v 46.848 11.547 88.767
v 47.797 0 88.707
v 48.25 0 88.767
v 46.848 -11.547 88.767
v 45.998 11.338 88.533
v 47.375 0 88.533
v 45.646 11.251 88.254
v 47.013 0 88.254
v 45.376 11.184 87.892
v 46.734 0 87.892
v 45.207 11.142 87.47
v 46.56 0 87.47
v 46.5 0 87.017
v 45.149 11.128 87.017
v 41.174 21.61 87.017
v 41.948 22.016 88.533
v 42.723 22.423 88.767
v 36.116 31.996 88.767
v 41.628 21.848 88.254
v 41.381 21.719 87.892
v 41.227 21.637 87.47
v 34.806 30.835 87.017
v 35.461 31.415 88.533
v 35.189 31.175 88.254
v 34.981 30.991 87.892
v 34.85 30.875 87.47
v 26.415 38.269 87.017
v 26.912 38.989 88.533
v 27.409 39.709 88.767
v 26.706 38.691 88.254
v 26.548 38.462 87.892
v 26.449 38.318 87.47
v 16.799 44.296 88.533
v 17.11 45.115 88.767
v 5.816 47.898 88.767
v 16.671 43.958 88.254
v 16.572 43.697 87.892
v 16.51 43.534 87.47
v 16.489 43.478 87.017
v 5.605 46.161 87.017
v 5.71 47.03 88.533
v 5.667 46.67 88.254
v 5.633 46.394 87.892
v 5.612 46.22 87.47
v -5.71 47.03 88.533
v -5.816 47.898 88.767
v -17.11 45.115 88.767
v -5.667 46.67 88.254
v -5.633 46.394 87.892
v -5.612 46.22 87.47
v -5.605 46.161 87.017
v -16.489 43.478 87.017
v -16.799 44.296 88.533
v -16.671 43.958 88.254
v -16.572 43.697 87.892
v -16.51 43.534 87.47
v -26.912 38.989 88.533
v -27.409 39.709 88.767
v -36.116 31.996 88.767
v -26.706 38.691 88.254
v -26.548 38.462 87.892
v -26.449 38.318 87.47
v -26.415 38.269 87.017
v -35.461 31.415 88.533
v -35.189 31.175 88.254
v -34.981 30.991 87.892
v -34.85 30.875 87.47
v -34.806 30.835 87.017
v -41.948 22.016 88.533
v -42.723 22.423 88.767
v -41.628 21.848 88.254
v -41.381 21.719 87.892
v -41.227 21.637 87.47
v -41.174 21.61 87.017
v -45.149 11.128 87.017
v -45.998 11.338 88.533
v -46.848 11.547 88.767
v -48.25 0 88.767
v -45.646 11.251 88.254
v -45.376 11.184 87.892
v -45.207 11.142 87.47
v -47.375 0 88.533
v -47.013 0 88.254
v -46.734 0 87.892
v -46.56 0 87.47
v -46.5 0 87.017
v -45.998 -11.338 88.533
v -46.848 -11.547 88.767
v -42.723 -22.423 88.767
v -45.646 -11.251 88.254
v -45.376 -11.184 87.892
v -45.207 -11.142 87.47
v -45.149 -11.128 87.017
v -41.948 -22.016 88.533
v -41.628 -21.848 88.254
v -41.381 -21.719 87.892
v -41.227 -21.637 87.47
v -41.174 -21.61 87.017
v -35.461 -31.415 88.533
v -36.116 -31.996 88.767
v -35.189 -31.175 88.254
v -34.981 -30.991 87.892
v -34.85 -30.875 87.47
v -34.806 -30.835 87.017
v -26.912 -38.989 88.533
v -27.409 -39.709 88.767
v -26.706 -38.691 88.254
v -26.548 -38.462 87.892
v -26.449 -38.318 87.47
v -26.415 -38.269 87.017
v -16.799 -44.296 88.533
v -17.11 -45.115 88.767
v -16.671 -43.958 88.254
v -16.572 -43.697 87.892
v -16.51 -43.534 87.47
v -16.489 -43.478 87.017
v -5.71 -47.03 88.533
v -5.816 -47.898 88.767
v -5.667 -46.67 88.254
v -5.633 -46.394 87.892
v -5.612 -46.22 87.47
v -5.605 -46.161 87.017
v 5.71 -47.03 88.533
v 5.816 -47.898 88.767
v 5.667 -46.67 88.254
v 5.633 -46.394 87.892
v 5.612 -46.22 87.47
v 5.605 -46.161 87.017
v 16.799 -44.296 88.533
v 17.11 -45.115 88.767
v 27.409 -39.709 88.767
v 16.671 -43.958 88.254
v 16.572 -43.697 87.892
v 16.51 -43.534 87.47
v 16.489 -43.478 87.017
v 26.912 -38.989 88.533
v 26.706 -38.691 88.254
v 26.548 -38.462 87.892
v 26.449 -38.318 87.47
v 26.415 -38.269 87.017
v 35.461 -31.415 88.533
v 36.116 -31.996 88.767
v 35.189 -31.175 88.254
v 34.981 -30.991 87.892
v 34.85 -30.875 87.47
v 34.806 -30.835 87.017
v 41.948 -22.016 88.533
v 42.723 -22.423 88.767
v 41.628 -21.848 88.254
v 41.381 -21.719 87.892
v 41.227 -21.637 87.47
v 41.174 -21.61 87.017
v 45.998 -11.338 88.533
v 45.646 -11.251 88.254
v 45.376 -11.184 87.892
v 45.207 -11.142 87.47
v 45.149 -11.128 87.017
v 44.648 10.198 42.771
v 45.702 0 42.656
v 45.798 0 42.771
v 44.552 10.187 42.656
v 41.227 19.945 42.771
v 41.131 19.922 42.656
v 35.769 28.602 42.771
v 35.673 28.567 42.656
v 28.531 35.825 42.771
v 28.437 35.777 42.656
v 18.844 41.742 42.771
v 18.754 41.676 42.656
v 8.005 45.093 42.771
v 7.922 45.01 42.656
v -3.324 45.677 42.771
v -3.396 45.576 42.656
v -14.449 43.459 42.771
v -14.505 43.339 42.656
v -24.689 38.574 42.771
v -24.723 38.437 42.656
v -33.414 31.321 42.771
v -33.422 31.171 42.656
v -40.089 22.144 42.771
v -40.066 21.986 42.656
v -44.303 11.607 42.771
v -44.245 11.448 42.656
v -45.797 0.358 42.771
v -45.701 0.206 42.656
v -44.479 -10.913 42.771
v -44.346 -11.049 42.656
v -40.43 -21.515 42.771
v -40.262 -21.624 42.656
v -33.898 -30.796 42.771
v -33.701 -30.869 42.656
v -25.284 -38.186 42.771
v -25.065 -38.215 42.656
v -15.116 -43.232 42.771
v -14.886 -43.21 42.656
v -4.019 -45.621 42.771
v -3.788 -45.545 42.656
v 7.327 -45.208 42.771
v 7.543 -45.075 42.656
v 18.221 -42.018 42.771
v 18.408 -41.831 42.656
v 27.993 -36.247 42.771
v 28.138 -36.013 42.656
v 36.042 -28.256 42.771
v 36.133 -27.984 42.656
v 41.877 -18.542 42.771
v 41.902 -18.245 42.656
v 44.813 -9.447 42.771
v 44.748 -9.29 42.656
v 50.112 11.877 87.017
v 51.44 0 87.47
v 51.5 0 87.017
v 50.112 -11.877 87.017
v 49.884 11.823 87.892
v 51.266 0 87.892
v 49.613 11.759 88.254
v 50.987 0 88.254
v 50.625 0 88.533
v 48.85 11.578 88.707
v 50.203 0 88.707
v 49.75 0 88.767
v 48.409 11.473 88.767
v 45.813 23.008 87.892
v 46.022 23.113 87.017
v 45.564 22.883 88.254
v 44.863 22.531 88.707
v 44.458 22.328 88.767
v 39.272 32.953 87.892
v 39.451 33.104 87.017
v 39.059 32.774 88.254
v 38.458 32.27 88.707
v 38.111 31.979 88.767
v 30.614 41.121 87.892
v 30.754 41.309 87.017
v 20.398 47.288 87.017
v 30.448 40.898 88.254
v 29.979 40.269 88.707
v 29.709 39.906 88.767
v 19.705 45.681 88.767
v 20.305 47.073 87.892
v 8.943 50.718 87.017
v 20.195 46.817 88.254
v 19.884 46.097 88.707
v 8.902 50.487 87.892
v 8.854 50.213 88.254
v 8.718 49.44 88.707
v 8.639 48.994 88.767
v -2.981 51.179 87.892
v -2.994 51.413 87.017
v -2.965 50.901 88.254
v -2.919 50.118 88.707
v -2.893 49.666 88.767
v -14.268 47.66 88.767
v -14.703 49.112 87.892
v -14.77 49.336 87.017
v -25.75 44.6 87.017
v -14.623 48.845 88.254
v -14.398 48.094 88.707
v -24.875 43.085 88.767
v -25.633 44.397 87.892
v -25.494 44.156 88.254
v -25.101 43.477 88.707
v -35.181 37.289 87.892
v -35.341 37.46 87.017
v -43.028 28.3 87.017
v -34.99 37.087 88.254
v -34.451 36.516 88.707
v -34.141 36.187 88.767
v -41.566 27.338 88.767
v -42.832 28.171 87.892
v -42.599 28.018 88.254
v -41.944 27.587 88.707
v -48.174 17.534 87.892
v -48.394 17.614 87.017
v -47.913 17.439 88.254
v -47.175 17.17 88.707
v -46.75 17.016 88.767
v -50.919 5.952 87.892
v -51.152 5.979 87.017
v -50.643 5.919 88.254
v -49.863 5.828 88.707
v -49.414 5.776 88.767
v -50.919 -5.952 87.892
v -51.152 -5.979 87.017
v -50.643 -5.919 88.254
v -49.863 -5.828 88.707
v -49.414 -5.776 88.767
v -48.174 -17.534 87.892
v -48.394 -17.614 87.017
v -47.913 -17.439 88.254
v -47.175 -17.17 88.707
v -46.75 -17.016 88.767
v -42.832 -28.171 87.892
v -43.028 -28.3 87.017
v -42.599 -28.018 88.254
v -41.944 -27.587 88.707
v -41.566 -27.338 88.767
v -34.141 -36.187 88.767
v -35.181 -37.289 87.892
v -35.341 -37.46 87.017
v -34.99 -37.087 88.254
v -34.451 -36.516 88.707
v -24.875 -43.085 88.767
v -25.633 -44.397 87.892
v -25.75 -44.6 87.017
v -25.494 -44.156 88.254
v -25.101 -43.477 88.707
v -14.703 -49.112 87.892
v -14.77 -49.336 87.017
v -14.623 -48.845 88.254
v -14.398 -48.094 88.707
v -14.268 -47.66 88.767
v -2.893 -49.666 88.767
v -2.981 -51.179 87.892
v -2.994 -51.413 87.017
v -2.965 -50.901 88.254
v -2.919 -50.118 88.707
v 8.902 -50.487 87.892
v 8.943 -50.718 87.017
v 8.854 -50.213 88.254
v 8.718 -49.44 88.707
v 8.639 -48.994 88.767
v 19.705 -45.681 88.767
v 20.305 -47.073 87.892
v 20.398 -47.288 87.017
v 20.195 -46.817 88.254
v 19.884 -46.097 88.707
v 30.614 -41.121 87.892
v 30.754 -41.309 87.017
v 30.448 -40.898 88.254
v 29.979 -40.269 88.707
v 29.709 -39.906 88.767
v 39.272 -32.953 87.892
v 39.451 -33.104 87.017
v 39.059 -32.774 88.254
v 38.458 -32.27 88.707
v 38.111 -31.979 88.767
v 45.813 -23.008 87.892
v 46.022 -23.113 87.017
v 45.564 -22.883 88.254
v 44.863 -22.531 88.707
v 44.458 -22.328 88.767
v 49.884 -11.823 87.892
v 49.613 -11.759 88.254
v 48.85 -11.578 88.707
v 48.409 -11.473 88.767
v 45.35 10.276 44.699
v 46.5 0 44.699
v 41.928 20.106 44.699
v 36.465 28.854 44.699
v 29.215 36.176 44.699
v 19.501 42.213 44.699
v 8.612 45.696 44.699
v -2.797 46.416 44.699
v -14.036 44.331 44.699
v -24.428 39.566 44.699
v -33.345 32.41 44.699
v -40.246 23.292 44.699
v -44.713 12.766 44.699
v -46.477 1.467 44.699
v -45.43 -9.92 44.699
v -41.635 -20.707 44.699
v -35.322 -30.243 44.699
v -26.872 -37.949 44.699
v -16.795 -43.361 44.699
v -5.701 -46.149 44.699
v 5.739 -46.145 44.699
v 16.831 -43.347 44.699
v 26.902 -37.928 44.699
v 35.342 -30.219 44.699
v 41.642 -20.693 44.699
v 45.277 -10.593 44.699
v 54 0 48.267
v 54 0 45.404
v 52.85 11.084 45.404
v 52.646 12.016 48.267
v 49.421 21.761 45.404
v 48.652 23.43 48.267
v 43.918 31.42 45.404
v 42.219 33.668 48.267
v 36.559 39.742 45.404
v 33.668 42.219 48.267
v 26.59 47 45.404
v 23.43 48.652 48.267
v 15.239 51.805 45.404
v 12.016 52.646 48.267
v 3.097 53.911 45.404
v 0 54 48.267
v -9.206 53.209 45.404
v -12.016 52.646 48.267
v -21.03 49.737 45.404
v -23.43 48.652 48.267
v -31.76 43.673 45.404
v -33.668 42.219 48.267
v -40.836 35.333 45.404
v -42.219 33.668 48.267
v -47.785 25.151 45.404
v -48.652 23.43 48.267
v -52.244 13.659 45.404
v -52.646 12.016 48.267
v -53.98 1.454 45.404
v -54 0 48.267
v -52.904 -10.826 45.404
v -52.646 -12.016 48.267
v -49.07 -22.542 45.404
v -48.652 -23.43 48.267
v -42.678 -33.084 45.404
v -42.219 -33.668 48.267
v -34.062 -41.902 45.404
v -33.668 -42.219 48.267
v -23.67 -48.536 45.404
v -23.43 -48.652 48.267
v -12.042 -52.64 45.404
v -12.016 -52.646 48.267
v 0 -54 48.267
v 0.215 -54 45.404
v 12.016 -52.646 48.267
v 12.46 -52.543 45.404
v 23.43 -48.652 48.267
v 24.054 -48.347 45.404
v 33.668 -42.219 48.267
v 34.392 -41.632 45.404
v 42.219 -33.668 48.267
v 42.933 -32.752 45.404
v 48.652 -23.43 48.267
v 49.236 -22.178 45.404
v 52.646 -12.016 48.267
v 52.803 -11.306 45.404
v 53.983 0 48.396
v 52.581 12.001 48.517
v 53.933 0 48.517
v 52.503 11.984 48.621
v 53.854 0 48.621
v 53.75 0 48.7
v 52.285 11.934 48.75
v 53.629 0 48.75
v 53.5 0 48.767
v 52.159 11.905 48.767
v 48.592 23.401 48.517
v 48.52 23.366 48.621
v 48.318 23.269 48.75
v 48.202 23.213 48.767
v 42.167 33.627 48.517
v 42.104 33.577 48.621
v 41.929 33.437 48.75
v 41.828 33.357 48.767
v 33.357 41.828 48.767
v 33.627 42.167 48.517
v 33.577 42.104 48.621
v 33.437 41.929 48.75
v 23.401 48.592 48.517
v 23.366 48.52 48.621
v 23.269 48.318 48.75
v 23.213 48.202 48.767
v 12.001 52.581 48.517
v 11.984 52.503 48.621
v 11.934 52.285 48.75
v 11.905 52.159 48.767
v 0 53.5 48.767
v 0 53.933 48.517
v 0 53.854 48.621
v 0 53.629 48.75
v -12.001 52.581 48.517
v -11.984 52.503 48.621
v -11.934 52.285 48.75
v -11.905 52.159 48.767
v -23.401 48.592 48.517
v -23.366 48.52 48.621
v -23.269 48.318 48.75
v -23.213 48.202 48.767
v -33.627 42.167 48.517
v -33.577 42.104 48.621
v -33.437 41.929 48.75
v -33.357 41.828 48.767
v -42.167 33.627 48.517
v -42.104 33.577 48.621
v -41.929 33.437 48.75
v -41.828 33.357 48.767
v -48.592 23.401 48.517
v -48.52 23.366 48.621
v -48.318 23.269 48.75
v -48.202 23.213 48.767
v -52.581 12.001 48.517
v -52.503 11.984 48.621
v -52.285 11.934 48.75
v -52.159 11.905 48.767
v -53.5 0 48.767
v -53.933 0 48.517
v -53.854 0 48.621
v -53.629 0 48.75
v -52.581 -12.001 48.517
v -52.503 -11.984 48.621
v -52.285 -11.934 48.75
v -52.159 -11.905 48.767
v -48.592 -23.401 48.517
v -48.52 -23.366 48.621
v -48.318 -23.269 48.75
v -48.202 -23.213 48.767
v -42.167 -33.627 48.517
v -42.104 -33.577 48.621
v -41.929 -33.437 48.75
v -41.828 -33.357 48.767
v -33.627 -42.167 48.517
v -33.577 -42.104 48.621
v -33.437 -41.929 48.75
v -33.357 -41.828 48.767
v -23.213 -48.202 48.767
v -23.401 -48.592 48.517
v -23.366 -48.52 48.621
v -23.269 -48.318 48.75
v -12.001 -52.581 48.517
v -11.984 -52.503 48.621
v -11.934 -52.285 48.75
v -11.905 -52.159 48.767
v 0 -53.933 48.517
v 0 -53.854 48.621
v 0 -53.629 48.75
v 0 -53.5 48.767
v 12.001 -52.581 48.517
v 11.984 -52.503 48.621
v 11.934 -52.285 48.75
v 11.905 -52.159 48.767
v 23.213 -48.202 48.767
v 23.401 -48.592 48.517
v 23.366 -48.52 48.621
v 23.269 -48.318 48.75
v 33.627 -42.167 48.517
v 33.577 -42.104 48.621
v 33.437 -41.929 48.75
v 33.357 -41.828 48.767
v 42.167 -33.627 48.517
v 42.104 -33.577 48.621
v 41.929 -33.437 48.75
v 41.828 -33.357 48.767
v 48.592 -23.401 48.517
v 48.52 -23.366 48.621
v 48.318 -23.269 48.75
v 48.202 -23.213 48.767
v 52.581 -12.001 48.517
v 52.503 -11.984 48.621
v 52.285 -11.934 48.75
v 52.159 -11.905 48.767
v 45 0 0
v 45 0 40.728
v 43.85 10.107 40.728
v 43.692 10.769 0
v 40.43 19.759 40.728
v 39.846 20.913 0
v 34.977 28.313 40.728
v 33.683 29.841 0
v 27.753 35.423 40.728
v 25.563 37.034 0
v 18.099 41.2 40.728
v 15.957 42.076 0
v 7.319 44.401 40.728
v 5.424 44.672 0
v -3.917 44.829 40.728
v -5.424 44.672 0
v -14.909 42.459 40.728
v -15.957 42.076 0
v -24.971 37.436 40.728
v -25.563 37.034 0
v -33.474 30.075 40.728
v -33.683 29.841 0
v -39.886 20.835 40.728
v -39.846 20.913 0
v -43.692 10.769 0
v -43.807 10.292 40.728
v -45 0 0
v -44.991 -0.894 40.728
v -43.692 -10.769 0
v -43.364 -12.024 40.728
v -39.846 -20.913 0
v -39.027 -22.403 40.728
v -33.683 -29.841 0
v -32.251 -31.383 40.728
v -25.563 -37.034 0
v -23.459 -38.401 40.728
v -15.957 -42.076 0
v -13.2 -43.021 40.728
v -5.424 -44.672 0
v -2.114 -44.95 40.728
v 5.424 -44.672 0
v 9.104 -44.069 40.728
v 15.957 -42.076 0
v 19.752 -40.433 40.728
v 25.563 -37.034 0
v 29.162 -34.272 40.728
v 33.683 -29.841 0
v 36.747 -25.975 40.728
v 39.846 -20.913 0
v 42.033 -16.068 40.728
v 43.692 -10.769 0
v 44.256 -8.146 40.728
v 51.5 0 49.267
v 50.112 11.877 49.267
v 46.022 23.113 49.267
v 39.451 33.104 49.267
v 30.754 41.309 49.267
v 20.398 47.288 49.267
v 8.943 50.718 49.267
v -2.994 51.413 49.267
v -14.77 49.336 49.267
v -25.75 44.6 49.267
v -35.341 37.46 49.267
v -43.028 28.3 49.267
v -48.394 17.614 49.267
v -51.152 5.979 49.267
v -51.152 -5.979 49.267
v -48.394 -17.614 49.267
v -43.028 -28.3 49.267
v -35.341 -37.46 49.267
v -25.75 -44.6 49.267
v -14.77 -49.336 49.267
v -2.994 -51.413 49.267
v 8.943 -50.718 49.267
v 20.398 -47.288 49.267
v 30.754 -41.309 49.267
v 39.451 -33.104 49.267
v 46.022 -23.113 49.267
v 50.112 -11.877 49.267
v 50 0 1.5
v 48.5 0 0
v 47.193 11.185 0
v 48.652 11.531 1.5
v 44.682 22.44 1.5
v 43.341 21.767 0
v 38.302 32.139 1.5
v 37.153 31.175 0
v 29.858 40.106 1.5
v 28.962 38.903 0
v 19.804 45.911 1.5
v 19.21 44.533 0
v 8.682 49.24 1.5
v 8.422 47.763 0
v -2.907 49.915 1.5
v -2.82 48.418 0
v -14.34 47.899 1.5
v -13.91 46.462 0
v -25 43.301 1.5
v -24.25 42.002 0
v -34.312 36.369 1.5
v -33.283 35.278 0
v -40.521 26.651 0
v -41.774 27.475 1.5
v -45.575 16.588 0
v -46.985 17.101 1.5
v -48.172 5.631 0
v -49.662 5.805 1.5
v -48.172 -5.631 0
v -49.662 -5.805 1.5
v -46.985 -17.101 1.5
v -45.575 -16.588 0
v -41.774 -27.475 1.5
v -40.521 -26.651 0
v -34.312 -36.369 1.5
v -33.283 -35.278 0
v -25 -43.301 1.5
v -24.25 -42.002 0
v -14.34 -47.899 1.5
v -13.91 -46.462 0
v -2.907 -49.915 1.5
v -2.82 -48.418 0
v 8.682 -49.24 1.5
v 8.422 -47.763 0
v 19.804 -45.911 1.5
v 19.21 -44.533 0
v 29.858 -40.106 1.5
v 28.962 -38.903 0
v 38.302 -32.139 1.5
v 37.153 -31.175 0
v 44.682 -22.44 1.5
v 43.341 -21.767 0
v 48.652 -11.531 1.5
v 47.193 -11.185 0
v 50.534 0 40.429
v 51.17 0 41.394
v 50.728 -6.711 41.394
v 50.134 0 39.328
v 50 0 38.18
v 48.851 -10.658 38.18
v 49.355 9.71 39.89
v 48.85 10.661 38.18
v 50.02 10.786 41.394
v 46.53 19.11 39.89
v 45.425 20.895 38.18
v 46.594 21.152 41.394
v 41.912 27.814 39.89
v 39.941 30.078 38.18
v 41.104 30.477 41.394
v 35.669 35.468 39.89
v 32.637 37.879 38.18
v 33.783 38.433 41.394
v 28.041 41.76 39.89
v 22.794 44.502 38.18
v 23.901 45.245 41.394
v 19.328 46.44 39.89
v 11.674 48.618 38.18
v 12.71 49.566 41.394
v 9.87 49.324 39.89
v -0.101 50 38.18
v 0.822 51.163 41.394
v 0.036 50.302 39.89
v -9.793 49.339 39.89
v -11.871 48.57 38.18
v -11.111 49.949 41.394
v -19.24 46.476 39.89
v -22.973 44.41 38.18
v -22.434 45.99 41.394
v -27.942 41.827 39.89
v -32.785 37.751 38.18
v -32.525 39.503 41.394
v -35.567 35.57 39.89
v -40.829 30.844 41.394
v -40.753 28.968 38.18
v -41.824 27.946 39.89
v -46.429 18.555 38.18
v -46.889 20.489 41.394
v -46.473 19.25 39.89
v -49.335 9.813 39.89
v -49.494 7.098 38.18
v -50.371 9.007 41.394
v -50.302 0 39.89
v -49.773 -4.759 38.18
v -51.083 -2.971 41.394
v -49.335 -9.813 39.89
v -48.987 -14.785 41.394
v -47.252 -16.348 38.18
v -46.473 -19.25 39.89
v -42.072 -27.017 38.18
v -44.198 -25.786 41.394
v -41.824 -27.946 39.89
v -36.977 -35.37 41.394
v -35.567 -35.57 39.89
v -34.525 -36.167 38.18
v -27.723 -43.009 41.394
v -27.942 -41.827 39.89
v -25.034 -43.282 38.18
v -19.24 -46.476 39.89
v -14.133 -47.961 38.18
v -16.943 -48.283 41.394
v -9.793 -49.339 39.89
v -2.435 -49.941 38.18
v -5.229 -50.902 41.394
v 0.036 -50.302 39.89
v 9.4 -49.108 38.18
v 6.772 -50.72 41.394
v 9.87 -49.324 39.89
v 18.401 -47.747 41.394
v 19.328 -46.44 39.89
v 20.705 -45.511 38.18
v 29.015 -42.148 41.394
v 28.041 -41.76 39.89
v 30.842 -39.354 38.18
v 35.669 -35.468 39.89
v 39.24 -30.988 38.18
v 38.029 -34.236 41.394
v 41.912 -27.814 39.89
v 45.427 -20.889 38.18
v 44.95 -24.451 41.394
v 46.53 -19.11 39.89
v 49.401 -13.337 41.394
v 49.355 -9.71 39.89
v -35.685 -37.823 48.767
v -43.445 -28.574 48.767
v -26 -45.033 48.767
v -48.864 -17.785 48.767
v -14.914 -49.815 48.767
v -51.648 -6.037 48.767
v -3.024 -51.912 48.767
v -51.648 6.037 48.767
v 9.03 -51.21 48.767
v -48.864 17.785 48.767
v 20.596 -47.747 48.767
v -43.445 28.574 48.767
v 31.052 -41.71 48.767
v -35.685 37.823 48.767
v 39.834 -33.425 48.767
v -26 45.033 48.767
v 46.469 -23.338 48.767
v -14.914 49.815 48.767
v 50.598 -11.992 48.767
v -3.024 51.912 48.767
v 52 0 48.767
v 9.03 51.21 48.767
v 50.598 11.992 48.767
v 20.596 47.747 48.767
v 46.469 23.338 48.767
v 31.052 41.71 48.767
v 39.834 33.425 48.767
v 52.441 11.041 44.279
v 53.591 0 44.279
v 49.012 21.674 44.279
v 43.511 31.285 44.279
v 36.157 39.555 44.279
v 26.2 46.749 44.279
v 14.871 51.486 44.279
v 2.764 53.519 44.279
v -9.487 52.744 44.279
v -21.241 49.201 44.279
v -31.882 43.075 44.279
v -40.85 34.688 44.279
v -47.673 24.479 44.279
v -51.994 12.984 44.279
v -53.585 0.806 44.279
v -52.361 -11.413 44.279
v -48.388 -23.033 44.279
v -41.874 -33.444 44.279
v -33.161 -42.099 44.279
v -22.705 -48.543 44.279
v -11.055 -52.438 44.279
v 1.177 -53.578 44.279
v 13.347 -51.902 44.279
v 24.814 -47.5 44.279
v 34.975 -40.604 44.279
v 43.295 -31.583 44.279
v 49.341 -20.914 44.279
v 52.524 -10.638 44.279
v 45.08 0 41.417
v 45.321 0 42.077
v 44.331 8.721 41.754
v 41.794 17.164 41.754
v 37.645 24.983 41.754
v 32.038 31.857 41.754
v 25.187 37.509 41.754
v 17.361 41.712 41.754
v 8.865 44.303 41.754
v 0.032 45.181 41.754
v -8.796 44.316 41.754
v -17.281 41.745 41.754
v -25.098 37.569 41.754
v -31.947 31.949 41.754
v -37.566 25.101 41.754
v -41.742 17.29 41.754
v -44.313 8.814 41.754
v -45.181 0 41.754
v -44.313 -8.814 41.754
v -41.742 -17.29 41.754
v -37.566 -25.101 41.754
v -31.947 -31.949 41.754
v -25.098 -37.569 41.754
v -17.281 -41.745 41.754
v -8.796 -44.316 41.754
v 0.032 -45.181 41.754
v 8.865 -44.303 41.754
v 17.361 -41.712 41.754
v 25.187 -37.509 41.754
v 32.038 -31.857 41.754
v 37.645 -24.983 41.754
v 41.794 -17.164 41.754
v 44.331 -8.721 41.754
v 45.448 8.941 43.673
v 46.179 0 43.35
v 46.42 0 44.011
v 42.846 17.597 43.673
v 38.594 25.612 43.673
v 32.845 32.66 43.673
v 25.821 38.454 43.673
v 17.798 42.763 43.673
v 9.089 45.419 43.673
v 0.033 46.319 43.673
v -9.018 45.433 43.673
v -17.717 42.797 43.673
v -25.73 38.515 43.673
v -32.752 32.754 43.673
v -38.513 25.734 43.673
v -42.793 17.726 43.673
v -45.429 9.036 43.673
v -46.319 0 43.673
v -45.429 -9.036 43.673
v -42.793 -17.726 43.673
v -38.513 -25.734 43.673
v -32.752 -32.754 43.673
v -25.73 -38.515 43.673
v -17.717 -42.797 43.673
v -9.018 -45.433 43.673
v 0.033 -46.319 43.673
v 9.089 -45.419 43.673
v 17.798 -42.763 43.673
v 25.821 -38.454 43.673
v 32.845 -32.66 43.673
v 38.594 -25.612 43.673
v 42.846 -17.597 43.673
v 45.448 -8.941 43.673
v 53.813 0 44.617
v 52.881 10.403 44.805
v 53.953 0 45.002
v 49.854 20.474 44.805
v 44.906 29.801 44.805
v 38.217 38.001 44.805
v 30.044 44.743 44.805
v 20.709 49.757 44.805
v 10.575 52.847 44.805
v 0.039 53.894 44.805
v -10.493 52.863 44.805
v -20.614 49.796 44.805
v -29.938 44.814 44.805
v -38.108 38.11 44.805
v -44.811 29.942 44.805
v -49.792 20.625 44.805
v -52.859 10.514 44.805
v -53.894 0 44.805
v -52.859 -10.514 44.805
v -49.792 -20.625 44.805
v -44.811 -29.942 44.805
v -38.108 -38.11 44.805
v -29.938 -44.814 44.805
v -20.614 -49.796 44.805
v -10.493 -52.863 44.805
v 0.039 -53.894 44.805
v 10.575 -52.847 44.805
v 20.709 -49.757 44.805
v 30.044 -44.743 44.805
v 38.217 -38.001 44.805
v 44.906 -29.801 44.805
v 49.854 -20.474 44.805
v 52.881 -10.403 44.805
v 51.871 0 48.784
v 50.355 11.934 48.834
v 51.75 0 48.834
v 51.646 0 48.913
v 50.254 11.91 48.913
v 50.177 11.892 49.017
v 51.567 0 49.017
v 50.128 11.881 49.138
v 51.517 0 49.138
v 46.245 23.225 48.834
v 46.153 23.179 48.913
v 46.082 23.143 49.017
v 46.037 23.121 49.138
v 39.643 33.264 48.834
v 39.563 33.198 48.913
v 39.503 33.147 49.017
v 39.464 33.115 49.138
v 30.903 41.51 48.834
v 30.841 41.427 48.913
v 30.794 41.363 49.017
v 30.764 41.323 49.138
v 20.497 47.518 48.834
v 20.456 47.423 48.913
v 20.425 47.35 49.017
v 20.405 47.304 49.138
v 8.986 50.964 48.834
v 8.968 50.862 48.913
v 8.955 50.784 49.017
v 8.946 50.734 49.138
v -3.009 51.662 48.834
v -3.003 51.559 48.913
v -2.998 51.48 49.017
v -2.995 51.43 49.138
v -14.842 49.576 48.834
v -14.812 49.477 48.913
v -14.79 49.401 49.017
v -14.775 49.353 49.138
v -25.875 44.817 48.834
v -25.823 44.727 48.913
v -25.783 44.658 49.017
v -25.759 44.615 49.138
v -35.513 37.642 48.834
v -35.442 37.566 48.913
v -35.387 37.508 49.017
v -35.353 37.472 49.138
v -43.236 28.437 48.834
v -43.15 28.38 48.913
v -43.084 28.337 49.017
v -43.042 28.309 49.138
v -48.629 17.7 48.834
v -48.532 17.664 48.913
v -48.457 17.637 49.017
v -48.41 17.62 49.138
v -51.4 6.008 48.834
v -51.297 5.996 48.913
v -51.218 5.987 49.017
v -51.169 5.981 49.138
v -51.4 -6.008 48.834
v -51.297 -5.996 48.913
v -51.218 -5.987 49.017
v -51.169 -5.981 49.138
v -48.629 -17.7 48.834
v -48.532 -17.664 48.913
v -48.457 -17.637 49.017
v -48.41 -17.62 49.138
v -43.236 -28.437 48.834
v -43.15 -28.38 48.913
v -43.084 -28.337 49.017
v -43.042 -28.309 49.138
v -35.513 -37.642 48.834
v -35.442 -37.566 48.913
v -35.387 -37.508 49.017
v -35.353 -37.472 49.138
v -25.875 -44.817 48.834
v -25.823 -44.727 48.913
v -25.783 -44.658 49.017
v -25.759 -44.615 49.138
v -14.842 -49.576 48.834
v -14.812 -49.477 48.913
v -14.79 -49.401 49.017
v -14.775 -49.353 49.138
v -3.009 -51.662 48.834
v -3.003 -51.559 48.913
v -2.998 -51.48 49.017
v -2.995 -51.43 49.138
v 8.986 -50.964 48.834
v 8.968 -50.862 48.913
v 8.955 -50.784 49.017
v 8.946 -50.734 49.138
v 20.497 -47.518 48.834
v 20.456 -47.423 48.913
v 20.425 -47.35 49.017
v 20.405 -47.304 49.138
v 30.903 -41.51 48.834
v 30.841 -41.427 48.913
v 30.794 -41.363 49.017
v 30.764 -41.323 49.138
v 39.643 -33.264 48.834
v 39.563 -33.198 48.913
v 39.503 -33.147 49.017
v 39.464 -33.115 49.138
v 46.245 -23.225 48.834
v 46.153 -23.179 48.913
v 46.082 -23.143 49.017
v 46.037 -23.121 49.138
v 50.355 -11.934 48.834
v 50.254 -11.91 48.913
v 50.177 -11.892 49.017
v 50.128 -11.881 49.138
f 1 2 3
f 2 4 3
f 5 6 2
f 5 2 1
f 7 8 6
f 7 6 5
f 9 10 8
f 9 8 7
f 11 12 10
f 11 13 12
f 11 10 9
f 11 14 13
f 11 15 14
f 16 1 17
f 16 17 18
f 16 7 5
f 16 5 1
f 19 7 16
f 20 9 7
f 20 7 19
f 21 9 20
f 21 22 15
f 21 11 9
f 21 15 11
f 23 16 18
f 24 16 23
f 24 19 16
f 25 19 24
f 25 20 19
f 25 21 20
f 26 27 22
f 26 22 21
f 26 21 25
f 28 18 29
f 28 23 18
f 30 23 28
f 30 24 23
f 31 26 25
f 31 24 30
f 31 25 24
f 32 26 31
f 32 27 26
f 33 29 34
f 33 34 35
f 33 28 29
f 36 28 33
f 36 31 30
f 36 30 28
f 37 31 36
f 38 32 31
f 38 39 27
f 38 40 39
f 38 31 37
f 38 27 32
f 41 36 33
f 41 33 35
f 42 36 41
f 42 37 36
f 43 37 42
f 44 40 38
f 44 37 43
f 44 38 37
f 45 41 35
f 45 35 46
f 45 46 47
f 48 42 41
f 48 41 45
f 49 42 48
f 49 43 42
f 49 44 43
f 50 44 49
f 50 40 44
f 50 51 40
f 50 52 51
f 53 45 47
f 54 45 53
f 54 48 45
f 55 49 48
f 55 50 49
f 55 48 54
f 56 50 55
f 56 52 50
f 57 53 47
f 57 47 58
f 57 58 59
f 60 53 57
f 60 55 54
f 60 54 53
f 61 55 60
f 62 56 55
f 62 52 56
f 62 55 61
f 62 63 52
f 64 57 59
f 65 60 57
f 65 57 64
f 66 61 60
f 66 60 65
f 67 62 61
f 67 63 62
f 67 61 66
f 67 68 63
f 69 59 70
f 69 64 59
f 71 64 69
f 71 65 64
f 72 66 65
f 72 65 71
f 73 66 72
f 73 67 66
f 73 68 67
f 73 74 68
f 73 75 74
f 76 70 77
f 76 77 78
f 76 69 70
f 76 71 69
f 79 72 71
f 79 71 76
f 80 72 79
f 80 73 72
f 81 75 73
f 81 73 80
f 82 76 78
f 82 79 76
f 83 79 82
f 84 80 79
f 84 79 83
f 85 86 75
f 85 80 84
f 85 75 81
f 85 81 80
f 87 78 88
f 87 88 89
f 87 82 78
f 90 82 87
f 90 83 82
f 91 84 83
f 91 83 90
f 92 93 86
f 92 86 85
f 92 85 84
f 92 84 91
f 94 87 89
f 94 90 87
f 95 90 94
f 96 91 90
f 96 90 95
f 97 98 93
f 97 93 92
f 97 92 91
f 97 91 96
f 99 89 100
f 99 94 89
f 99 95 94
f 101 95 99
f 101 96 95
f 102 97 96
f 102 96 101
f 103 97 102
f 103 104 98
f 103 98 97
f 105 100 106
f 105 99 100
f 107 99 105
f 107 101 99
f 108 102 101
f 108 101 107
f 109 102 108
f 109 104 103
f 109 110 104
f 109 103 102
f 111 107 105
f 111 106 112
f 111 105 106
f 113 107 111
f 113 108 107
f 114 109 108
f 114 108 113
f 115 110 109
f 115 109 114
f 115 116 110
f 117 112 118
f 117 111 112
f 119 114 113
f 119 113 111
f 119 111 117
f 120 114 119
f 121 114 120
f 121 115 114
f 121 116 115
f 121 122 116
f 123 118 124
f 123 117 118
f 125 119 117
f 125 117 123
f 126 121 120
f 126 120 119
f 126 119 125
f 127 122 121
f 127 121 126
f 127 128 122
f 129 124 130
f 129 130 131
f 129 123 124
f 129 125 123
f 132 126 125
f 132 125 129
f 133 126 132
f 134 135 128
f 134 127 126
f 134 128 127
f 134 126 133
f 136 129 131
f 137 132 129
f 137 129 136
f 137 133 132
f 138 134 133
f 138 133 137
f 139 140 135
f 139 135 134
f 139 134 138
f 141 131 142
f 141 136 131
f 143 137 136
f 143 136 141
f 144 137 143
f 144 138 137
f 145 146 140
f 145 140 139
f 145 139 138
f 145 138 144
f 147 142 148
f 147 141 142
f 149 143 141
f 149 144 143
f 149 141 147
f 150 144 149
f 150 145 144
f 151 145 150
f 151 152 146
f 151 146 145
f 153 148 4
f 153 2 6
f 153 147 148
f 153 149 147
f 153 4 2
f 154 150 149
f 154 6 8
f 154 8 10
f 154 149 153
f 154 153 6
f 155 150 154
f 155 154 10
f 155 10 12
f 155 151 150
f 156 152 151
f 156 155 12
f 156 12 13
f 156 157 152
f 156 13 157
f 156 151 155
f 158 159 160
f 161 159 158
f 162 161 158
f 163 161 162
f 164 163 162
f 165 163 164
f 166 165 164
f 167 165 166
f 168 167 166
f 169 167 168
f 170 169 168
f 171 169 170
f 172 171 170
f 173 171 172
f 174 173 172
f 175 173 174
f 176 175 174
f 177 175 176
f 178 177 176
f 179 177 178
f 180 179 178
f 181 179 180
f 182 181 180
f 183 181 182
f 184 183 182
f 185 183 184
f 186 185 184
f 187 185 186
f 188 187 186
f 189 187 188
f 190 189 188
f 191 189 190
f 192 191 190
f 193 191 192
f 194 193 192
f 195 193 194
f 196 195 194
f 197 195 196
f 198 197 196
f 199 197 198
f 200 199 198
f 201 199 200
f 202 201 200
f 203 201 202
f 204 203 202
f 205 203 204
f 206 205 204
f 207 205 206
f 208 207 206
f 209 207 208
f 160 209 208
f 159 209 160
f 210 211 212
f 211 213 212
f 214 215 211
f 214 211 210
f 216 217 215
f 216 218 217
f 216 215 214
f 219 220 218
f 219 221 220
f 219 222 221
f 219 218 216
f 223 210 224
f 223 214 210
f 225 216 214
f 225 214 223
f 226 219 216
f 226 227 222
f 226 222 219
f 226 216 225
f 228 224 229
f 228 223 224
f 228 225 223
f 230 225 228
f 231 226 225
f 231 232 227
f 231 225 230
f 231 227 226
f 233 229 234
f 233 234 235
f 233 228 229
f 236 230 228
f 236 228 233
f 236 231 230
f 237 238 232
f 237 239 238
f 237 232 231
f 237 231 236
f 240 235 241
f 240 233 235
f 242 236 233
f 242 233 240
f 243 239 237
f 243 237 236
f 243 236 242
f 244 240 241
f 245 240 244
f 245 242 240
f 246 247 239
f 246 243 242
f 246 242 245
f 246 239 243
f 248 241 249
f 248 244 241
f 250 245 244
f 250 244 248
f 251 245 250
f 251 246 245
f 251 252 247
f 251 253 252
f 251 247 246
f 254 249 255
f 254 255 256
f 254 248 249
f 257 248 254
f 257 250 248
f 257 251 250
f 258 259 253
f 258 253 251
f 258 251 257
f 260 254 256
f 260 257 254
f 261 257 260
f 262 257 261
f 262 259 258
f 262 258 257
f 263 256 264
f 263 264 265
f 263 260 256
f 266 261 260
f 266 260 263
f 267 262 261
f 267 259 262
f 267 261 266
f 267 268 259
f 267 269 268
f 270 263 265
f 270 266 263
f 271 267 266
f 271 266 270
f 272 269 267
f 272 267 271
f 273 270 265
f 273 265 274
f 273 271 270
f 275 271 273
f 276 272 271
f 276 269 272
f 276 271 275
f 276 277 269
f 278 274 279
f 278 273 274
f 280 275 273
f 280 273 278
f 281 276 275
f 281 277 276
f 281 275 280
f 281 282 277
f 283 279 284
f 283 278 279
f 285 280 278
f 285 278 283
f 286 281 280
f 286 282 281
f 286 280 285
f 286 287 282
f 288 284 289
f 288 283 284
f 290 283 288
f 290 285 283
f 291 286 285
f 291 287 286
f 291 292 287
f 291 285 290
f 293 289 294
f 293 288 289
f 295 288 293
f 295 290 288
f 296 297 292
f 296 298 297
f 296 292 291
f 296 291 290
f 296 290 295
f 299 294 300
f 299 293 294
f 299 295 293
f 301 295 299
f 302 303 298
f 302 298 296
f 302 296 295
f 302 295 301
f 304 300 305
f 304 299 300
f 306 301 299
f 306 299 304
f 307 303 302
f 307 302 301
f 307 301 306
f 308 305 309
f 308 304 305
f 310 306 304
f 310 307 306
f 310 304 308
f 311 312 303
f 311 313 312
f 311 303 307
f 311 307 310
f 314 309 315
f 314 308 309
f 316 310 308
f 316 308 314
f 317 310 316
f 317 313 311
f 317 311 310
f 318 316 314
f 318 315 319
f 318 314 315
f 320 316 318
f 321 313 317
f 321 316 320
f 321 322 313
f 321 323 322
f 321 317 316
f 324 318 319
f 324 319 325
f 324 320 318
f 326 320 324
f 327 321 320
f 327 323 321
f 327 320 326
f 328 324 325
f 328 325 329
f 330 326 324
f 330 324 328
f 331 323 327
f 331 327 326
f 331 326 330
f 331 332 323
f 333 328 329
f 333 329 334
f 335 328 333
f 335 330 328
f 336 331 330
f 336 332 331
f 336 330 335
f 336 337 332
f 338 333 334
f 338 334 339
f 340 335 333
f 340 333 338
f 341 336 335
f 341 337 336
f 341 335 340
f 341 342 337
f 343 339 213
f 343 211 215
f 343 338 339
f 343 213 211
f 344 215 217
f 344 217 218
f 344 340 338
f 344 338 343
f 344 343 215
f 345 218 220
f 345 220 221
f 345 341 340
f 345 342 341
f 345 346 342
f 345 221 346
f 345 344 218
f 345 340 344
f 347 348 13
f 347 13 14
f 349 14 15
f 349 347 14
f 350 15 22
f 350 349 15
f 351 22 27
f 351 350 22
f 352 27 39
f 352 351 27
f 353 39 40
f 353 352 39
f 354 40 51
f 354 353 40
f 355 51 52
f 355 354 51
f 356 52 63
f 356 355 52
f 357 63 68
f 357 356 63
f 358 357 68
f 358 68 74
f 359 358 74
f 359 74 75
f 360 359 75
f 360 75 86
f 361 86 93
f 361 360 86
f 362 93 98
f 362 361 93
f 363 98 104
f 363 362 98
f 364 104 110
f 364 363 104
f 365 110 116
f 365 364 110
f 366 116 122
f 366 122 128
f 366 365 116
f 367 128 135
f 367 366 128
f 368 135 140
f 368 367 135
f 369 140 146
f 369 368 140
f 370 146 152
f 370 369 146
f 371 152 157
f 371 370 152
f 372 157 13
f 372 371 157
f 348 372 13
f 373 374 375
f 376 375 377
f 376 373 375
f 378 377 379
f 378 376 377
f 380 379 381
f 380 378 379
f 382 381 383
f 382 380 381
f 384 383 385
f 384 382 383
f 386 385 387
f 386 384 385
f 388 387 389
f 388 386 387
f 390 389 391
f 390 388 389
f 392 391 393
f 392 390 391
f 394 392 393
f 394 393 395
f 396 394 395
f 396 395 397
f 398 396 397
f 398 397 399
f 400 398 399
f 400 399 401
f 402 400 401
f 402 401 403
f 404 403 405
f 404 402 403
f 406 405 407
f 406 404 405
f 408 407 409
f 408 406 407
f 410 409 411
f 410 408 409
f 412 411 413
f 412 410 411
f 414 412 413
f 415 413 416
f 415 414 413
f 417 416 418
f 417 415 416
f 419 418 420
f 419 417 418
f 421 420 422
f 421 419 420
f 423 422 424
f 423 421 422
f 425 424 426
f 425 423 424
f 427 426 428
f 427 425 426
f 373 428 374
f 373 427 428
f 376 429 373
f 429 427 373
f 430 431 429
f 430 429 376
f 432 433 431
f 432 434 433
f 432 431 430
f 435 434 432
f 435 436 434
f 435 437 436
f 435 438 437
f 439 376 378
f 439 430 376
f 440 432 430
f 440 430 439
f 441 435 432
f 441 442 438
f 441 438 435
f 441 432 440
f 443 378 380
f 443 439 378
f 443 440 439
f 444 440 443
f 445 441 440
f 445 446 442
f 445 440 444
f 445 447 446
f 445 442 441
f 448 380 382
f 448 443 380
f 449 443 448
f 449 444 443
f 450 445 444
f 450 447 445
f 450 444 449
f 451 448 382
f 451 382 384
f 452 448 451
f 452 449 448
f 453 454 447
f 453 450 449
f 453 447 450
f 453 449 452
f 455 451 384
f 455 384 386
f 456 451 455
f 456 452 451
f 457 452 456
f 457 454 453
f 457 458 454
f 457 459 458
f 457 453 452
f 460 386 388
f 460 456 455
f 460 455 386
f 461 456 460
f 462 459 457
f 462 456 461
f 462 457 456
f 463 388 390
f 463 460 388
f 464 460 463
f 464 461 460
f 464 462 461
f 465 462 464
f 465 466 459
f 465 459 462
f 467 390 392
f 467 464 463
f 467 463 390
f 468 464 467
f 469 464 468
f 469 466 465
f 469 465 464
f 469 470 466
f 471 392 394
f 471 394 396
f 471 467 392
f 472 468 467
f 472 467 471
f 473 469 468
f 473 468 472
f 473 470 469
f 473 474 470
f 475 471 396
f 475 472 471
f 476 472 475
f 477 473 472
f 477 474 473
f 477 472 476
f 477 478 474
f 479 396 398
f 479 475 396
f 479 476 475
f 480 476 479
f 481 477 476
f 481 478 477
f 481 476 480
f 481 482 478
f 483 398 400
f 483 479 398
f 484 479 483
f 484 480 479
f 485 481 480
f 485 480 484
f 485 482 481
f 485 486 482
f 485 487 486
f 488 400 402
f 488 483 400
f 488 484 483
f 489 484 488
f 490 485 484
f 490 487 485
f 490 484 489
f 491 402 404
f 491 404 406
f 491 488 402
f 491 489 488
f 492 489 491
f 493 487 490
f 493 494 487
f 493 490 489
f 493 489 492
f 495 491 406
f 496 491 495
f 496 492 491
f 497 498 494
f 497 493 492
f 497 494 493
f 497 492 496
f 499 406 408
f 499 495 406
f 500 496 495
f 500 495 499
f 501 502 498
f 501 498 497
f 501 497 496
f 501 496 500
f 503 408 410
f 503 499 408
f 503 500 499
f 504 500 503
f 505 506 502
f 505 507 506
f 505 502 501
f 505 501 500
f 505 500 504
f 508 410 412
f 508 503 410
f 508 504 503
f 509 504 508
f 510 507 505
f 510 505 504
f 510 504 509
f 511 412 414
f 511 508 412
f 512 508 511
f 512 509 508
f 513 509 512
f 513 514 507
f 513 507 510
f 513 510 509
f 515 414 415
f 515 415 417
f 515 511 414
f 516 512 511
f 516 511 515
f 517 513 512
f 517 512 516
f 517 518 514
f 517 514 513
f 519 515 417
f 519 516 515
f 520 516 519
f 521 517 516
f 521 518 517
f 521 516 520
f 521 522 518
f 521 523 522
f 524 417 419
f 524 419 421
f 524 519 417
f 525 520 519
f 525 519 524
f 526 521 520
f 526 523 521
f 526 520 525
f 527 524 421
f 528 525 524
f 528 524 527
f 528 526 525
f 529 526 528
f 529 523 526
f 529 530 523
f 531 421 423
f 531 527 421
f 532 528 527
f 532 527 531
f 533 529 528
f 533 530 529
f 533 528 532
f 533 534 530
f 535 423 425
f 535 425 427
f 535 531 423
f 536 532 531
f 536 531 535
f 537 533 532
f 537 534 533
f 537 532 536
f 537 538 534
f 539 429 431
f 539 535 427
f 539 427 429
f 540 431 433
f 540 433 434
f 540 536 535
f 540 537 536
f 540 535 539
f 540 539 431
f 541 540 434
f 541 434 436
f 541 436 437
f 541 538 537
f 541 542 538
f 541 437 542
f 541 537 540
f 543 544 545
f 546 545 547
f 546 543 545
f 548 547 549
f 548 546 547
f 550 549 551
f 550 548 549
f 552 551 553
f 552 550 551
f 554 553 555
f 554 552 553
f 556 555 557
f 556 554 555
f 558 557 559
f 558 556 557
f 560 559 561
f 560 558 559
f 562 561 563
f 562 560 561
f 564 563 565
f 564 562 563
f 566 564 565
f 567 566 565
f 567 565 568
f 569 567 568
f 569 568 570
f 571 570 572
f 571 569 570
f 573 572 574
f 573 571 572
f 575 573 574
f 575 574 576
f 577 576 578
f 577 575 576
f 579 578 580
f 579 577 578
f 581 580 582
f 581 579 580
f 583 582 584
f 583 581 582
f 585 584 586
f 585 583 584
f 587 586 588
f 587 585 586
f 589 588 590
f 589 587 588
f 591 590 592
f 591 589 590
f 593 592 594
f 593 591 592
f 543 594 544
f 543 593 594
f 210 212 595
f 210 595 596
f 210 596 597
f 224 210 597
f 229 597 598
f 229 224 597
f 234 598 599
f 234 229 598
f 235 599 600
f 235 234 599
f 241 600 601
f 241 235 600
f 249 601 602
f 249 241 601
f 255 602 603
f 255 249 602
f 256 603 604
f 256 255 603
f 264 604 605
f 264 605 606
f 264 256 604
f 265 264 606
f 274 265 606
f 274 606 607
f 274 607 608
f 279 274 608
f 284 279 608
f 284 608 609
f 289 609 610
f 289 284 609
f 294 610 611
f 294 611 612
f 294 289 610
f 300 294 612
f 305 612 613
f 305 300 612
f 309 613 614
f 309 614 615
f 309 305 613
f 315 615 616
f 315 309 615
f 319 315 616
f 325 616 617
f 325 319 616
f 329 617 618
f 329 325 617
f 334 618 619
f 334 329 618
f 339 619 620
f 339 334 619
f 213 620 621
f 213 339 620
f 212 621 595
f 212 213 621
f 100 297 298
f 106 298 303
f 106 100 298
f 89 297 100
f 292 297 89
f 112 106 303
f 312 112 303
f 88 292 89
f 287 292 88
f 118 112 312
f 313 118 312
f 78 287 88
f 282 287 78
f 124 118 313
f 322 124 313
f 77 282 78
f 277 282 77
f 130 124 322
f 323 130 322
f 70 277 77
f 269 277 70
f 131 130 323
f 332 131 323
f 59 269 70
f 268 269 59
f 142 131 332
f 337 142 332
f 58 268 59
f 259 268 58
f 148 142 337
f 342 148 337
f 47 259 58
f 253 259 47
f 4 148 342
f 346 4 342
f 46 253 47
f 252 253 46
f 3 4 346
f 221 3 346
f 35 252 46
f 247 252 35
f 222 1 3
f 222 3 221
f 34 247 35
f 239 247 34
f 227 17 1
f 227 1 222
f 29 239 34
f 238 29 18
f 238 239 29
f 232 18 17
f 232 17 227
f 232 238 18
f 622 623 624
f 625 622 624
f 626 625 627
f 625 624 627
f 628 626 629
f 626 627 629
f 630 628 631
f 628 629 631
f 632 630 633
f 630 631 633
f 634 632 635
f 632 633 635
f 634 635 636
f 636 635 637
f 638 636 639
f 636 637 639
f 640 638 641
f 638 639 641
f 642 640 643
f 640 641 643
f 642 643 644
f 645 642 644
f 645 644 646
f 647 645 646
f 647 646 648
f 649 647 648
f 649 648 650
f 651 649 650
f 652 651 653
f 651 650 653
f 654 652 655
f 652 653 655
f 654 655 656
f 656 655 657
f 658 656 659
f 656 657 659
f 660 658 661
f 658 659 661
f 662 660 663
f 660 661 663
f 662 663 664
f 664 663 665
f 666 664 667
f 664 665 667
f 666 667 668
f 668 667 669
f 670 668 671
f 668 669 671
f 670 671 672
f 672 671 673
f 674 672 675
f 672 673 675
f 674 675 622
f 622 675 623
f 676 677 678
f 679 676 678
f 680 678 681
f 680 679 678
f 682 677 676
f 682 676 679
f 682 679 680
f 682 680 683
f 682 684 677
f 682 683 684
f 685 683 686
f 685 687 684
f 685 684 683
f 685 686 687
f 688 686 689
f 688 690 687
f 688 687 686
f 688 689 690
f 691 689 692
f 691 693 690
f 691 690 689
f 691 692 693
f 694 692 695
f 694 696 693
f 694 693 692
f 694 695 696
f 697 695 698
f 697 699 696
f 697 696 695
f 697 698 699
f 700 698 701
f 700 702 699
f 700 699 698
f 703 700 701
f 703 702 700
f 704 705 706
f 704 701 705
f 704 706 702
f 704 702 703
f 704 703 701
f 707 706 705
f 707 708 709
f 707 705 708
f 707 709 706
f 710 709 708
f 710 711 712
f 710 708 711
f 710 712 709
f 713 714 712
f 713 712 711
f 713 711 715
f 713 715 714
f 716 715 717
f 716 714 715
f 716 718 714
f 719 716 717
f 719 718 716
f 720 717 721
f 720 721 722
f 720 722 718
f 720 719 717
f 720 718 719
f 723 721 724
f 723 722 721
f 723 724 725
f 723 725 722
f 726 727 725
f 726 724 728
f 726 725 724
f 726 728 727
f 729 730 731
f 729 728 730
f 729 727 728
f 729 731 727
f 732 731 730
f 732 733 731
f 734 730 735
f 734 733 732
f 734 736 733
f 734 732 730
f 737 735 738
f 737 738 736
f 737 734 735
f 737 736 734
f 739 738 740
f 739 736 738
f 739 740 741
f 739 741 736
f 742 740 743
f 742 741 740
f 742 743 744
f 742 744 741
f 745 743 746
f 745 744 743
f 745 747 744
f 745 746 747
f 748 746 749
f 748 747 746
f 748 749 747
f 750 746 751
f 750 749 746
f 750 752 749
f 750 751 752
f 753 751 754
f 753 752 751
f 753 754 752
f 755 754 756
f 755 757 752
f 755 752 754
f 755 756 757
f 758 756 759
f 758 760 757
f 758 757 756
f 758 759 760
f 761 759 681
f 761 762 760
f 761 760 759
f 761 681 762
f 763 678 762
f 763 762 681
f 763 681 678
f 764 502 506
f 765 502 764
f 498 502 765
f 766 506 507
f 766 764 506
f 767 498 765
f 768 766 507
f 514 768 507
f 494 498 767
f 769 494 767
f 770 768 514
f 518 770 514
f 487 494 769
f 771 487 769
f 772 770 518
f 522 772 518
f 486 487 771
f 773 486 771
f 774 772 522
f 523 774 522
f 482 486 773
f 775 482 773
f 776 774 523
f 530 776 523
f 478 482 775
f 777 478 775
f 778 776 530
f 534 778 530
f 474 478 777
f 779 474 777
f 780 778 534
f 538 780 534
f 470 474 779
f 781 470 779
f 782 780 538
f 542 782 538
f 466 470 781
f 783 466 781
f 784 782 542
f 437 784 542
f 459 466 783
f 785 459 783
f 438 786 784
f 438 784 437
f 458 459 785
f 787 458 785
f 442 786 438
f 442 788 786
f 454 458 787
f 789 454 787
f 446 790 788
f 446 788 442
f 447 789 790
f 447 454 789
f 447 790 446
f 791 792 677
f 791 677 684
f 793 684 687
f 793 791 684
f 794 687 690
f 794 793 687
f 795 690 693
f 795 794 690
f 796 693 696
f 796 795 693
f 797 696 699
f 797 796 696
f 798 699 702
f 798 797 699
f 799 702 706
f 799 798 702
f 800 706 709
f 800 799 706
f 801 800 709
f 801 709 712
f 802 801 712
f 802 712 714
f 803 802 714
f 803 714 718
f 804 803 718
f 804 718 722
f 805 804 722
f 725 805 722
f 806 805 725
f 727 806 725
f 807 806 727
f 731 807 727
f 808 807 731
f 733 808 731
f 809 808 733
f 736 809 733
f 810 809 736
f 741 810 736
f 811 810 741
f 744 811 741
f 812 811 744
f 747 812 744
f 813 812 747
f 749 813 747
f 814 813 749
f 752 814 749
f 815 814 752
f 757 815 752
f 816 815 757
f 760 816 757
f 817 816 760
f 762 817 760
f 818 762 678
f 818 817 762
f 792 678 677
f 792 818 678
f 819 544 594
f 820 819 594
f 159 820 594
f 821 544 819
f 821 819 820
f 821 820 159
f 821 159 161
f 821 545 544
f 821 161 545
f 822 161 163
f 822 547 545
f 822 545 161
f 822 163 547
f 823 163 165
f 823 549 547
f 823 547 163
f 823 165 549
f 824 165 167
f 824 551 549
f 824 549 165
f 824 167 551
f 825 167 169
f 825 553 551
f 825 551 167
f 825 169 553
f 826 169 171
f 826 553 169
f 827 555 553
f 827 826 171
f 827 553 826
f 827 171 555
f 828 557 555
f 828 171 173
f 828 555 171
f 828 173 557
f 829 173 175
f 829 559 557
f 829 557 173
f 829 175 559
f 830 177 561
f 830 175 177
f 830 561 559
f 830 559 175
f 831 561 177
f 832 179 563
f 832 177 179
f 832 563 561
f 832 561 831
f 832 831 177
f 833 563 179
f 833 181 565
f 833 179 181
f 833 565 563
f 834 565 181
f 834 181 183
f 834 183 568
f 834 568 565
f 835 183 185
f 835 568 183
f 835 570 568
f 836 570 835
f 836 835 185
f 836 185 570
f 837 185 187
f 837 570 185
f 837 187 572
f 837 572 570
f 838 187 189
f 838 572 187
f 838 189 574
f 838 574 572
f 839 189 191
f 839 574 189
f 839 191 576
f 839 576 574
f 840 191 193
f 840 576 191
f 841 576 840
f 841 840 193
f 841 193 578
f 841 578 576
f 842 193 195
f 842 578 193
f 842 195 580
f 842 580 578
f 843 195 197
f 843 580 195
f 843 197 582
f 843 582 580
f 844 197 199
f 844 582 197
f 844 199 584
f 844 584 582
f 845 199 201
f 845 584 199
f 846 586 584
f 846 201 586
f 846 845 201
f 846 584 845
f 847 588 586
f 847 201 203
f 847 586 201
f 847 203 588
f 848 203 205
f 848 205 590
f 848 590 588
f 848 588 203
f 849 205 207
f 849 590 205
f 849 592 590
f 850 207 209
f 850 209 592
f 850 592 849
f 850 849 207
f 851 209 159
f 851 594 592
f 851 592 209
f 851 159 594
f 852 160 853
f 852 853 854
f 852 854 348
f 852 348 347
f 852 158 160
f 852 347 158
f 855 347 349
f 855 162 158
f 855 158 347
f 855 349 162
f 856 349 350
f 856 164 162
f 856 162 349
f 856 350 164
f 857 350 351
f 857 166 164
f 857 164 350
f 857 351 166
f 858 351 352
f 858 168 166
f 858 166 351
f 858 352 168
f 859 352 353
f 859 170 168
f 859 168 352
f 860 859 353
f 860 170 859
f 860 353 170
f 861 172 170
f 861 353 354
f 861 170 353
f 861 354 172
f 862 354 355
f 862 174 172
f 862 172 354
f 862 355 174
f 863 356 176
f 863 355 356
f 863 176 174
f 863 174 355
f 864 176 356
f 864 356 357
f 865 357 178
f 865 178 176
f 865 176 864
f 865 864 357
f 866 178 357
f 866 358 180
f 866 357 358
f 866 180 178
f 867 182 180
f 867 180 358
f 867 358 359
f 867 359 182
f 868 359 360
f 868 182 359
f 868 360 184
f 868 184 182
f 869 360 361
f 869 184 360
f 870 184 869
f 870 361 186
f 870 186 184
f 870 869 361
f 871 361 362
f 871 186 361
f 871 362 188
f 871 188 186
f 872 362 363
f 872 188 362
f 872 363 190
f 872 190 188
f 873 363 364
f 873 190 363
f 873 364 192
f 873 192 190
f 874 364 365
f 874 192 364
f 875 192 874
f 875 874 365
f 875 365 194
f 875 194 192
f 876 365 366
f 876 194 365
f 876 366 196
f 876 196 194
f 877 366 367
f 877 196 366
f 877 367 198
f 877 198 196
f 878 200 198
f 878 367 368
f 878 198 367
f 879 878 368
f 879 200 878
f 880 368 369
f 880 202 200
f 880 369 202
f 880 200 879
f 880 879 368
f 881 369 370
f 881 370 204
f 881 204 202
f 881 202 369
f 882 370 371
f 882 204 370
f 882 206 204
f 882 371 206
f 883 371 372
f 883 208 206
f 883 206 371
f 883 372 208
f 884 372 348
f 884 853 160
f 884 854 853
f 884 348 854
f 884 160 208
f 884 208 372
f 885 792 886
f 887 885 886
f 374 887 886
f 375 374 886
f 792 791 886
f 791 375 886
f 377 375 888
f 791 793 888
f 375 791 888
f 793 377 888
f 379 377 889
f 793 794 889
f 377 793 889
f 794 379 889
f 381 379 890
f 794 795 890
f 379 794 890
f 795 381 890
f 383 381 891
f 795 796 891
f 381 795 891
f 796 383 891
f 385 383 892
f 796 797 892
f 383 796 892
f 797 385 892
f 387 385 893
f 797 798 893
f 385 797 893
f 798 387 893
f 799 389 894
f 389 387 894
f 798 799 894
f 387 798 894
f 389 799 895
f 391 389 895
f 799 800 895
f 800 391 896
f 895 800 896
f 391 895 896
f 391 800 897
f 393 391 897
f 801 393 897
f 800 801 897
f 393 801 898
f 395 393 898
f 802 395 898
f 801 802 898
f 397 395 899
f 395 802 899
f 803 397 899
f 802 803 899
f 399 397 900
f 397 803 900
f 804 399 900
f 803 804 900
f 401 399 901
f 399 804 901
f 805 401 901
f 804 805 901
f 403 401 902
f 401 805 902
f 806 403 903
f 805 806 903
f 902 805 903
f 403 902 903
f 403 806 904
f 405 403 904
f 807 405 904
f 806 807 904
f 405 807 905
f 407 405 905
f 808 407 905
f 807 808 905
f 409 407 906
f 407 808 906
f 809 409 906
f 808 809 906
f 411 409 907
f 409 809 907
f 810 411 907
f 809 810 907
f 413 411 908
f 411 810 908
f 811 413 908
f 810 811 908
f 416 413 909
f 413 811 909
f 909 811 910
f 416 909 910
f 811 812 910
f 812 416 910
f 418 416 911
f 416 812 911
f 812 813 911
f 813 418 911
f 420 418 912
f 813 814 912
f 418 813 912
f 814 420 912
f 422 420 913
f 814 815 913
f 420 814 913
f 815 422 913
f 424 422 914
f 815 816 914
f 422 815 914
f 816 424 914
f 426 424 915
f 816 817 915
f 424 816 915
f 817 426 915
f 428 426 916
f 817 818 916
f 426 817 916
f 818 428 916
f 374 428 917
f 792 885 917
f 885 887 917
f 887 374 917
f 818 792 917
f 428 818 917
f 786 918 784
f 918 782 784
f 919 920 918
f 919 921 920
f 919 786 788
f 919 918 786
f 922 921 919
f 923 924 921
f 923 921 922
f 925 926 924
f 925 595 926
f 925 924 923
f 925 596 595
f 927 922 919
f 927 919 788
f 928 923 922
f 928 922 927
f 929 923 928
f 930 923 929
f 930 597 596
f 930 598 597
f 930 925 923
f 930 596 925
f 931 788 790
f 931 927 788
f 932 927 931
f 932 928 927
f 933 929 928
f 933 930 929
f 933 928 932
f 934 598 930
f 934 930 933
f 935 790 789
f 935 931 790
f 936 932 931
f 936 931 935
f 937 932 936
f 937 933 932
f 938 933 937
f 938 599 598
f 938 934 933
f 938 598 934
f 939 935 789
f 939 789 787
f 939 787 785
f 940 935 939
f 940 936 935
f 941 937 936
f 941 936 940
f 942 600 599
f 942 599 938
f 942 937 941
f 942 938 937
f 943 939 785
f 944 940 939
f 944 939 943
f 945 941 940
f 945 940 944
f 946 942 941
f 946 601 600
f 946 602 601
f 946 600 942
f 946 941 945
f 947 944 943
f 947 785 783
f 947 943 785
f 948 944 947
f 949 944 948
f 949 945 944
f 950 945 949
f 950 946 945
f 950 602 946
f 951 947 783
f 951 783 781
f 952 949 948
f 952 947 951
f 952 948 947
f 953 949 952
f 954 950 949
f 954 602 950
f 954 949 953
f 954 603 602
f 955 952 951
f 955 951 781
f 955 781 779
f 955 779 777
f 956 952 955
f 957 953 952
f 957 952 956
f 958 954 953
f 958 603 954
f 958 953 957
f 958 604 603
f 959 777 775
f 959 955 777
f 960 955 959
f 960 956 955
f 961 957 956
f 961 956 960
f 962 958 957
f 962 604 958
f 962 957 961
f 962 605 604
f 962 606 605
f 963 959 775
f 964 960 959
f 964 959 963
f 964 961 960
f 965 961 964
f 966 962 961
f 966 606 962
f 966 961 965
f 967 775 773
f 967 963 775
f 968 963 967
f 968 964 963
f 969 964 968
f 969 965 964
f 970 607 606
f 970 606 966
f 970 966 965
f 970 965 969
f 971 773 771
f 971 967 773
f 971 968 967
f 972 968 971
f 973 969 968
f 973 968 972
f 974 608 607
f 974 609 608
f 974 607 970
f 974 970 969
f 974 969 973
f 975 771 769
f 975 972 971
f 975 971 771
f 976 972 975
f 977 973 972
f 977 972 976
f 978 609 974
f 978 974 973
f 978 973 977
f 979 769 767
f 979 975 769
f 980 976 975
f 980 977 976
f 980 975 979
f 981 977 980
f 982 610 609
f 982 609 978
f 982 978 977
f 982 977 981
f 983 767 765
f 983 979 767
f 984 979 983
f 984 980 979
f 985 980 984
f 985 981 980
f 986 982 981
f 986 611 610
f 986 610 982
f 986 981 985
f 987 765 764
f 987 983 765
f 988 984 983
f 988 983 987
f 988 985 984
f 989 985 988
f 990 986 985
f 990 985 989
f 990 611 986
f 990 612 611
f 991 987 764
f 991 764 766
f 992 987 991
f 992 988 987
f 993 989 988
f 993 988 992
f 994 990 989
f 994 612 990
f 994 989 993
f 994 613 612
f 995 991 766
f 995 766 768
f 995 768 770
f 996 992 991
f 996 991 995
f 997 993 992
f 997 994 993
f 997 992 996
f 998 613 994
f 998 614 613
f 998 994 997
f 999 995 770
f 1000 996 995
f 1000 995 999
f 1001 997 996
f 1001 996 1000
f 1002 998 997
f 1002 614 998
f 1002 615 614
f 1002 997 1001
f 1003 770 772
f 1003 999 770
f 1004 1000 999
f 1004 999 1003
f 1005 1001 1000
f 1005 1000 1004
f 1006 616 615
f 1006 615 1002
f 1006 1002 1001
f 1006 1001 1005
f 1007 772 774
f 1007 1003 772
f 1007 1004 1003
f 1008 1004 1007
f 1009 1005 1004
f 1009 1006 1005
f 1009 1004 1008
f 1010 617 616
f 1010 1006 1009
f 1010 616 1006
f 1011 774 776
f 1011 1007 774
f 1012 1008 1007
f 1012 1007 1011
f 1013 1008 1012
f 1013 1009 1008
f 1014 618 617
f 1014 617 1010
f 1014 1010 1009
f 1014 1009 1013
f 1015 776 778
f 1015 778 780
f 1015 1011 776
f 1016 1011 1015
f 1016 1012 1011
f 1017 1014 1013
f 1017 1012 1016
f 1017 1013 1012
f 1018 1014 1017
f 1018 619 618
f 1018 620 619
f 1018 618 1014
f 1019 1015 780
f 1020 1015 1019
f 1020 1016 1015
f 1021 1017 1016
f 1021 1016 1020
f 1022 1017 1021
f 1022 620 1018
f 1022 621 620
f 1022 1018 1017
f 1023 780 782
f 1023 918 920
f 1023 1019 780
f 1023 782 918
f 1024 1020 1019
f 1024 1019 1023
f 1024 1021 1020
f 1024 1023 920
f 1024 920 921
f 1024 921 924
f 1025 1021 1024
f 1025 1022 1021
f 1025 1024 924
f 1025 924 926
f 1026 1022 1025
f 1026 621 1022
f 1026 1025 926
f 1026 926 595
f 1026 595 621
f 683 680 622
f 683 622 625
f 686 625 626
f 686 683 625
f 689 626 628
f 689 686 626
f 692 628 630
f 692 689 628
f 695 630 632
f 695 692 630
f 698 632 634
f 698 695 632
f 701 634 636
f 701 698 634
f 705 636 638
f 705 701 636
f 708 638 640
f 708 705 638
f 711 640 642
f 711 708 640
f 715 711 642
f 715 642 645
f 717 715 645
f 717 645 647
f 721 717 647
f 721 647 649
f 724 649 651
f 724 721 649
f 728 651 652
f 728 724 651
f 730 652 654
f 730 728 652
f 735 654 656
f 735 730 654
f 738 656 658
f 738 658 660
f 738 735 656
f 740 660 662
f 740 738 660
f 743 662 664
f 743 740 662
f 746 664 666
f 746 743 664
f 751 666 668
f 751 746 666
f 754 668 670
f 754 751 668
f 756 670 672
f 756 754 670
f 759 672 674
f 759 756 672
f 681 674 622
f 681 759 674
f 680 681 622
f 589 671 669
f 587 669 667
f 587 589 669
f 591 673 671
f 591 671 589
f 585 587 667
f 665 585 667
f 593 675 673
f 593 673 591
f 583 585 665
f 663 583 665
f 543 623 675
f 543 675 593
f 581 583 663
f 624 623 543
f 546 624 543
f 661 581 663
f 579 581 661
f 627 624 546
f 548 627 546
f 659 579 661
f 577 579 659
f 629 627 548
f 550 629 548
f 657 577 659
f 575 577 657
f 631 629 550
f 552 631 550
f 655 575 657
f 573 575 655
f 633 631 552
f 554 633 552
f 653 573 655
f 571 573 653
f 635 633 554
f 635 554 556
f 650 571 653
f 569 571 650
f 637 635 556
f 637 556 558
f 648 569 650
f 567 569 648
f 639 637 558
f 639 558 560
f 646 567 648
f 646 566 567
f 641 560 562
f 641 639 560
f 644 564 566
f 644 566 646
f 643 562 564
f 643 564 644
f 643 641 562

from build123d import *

# Parameters (mm, degrees)
F2_R    = 1.75
F3_R    = 0.5
F4_R    = 5
F5_SIZE = 1.5
F6_R    = 3


with BuildPart() as f1:
    # F0 (on Front) → F1 (revolve)
    with BuildSketch(Plane.XZ):
        Polygon((45, 0), (50, 0), (50, 40), (54, 44.767014), (54, 48.767014), (51.5, 48.767014), (51.5, 88.767014), (46.5, 88.767014), (46.5, 43.607482), (45, 41.819851), align=None)
    revolve(axis=Axis((0, 0, 46.684548), (0, 0, 1)))

    # F2
    f2_edges = [f1.edges().sort_by_distance(p)[0] for p in [
        (-51.5, 0, 88.767014),
        (-46.5, 0, 88.767014),
        (-54, 0, 44.767014),
    ]]
    fillet(f2_edges, radius=F2_R)

    # F3
    f3_edges = [f1.edges().sort_by_distance(p)[0] for p in [
        (-54, 0, 48.767014),
        (-51.5, 0, 48.767014),
    ]]
    fillet(f3_edges, radius=F3_R)

    # F4
    f4_edges = [f1.edges().sort_by_distance(p)[0] for p in [
        (-50, 0, 40),
    ]]
    fillet(f4_edges, radius=F4_R)

    # F5
    f5_edges = [f1.edges().sort_by_distance(p)[0] for p in [
        (-50, 0, 0),
    ]]
    chamfer(f5_edges, length=F5_SIZE)

    # F6
    f6_edges = [f1.edges().sort_by_distance(p)[0] for p in [
        (-46.5, 0, 43.607482),
        (-45, 0, 41.819851),
    ]]
    fillet(f6_edges, radius=F6_R)


solid = f1.part
